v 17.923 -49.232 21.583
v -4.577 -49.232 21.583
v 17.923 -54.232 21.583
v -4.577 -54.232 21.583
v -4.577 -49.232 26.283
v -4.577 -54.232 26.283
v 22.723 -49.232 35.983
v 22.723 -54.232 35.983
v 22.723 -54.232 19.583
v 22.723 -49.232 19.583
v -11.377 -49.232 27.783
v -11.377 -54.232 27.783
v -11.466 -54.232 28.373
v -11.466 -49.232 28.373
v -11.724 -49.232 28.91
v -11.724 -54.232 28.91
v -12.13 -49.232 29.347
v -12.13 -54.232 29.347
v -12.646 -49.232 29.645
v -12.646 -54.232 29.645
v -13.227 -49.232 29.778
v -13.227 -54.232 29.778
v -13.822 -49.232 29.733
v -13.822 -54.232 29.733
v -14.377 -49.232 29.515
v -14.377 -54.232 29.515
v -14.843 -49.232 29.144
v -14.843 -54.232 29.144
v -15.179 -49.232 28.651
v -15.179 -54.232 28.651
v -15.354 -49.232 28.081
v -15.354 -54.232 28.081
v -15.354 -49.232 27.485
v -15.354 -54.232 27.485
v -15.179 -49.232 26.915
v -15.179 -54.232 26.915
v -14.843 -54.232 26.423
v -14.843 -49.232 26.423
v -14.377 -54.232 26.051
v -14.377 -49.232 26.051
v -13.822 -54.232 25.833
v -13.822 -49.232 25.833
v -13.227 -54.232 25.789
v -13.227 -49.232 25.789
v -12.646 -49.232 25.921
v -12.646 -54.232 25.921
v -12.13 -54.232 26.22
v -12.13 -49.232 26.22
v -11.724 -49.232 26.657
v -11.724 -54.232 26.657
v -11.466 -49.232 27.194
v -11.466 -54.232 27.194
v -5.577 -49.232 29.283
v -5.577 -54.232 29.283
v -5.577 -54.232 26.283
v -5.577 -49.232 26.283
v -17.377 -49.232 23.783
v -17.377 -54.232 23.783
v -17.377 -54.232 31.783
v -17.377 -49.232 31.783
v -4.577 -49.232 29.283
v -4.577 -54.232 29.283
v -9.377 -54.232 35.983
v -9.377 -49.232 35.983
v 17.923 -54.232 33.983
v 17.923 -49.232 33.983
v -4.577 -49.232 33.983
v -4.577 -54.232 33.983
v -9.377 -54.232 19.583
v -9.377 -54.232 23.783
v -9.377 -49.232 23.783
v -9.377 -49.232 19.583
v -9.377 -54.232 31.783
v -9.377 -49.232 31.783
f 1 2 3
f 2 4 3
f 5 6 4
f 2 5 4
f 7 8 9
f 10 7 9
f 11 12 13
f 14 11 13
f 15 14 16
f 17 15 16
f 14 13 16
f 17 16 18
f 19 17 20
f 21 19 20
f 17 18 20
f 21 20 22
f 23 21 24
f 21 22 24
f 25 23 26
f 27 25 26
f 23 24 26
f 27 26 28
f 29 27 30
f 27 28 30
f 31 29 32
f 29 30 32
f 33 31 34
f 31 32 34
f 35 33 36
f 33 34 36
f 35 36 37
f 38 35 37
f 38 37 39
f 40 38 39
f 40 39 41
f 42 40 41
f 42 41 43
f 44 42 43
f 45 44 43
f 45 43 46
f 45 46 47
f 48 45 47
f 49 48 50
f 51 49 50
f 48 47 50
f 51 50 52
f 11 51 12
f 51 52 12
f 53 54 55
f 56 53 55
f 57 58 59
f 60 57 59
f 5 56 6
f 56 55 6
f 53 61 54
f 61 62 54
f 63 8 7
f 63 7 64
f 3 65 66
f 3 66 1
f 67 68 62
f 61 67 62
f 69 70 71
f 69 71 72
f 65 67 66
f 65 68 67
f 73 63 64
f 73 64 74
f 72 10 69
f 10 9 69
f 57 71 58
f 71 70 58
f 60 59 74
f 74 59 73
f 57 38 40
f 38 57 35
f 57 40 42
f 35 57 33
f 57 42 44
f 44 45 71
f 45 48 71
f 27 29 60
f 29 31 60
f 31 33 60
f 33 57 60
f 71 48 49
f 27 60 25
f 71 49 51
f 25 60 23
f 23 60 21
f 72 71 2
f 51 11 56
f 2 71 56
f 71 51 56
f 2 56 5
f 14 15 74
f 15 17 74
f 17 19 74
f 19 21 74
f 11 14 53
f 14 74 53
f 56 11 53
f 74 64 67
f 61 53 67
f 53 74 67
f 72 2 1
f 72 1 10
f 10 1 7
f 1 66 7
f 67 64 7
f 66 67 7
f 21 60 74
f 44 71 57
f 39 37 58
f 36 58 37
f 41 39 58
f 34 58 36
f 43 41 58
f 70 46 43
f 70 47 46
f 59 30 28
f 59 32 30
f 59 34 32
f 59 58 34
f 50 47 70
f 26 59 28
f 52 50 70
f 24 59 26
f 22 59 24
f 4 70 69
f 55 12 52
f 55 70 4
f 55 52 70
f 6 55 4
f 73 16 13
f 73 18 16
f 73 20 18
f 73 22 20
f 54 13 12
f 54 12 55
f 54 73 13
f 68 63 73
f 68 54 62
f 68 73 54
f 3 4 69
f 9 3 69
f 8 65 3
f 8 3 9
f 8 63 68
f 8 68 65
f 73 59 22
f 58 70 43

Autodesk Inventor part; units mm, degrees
ref_plane "YZ Plane" through (0, 0, 0) normal (1, 0, 0) x (0, 1, 0)
ref_plane "Work Plane1" through (-8.5267, 21.9678, 110.0832) normal (0, 0, 1) x (1, 0, 0)
sketch "Sketch1" plane through (-8.5267, 21.9678, 110.0832) normal (0, 0, 1) x (1, 0, 0)
  line L0 (3.95, 0) -> (3.95, -10.3) projected
  line L1 (3.95, 0) -> (3.95, -5.15)
  line L2 (4.8, 0) -> (4.8, -10.3) projected
  point P0 (8.5267, -21.9678)
ref_plane "Work Plane3" through (-8.5267, -54.2322, 21.6832) normal (0, -1, 0) x (1, 0, 0)
sketch "Sketch6" plane through (-8.5267, -54.2322, 21.6832) normal (0, -1, 0) x (1, 0, 0)
  line L0 (3.95, 0.85) -> (3.95, 11.35) projected
  line L1 (3.95, 12.3) -> (3.95, -0.1)
  line L2 (5.95, 4.6) -> (5.95, 7.6) projected
  line L3 (25.6, 12.1) -> (4.8, 12.1) construction
  line L4 (15.2, 12.1) -> (15.2, 0) construction
  line L5 (25.6, 0) -> (4.8, 0) construction
  line L6 (26.45, 12.3) -> (26.45, -0.1)
  line L7 (-0.85, 6.1) -> (31.25, 6.1) construction
  line L8 (31.25, 14.3) -> (-0.85, 14.3)
  line L9 (31.25, -2.1) -> (-0.85, -2.1)
  line L10 (-0.85, 14.3) -> (-0.85, -2.1)
  line L11 (31.25, 14.3) -> (31.25, -2.1)
  line L12 (3.95, 12.3) -> (26.45, 12.3)
  line L13 (3.95, -0.1) -> (26.45, -0.1)
  point P0 (5.95, 6.1)
  point P1 (3.95, 6.1)
  point P2 (-0.85, 6.1)
  point P3 (26.45, 6.1)
  point P4 (31.25, 6.1)
  dimension "d19" = 12.4
extrude "Extrusion4" add sketch "Sketch6" against normal blind 5
sketch "Sketch7" plane through (-8.5267, -54.2322, 21.6832) normal (0, -1, 0) x (1, 0, 0)
  line L0 (2.95, 4.6) -> (3.95, 4.6)
  line L1 (3.95, 4.6) -> (3.95, 7.6)
  line L2 (3.95, 7.6) -> (2.95, 7.6)
  line L3 (2.95, 7.6) -> (2.95, 4.6)
  line L4 (3.95, -0.1) -> (3.95, 12.3) projected
  line L5 (-0.85, 14.3) -> (-0.85, -2.1) projected
  point P0 (8.5267, -21.6832)
  point P1 (2.95, 6.1)
  point P2 (3.95, 6.1)
  dimension "d20" = 1
  dimension "d21" = 3
extrude "Extrusion5" cut sketch "Sketch7" against normal up to surface (5 mm away)
sketch "Sketch8" plane through (-8.5267, -54.2322, 21.6832) normal (0, -1, 0) x (1, 0, 0)
  line L0 (-0.85, 14.3) -> (-0.85, -2.1) projected
  line L1 (-0.85, 2.1) -> (-8.85, 2.1)
  line L2 (-8.85, 2.1) -> (-8.85, 10.1)
  line L3 (-8.85, 10.1) -> (-0.85, 10.1)
  line L4 (-0.85, 10.1) -> (-0.85, 2.1)
  line L5 (4.05, 11.35) -> (4.05, 0.85) projected
  circle A0 centre (-4.85, 6.1) radius 2
  point P0 (8.5267, -21.6832)
  point P1 (-8.85, 6.1)
  point P2 (4.05, 6.1)
  point P3 (-4.85, 2.1)
  dimension "d24" = 8
  dimension "d25" = 8
  dimension "d26" = 4
extrude "Extrusion6" add sketch "Sketch8" against normal up to surface (5 mm away)
ref_plane "Work Plane4" through (-4.5767, -54.2322, 27.7832) normal (0, 0, 1) x (1, 0, 0)
properties part number "SG90 360 Degree Servo Holder"
